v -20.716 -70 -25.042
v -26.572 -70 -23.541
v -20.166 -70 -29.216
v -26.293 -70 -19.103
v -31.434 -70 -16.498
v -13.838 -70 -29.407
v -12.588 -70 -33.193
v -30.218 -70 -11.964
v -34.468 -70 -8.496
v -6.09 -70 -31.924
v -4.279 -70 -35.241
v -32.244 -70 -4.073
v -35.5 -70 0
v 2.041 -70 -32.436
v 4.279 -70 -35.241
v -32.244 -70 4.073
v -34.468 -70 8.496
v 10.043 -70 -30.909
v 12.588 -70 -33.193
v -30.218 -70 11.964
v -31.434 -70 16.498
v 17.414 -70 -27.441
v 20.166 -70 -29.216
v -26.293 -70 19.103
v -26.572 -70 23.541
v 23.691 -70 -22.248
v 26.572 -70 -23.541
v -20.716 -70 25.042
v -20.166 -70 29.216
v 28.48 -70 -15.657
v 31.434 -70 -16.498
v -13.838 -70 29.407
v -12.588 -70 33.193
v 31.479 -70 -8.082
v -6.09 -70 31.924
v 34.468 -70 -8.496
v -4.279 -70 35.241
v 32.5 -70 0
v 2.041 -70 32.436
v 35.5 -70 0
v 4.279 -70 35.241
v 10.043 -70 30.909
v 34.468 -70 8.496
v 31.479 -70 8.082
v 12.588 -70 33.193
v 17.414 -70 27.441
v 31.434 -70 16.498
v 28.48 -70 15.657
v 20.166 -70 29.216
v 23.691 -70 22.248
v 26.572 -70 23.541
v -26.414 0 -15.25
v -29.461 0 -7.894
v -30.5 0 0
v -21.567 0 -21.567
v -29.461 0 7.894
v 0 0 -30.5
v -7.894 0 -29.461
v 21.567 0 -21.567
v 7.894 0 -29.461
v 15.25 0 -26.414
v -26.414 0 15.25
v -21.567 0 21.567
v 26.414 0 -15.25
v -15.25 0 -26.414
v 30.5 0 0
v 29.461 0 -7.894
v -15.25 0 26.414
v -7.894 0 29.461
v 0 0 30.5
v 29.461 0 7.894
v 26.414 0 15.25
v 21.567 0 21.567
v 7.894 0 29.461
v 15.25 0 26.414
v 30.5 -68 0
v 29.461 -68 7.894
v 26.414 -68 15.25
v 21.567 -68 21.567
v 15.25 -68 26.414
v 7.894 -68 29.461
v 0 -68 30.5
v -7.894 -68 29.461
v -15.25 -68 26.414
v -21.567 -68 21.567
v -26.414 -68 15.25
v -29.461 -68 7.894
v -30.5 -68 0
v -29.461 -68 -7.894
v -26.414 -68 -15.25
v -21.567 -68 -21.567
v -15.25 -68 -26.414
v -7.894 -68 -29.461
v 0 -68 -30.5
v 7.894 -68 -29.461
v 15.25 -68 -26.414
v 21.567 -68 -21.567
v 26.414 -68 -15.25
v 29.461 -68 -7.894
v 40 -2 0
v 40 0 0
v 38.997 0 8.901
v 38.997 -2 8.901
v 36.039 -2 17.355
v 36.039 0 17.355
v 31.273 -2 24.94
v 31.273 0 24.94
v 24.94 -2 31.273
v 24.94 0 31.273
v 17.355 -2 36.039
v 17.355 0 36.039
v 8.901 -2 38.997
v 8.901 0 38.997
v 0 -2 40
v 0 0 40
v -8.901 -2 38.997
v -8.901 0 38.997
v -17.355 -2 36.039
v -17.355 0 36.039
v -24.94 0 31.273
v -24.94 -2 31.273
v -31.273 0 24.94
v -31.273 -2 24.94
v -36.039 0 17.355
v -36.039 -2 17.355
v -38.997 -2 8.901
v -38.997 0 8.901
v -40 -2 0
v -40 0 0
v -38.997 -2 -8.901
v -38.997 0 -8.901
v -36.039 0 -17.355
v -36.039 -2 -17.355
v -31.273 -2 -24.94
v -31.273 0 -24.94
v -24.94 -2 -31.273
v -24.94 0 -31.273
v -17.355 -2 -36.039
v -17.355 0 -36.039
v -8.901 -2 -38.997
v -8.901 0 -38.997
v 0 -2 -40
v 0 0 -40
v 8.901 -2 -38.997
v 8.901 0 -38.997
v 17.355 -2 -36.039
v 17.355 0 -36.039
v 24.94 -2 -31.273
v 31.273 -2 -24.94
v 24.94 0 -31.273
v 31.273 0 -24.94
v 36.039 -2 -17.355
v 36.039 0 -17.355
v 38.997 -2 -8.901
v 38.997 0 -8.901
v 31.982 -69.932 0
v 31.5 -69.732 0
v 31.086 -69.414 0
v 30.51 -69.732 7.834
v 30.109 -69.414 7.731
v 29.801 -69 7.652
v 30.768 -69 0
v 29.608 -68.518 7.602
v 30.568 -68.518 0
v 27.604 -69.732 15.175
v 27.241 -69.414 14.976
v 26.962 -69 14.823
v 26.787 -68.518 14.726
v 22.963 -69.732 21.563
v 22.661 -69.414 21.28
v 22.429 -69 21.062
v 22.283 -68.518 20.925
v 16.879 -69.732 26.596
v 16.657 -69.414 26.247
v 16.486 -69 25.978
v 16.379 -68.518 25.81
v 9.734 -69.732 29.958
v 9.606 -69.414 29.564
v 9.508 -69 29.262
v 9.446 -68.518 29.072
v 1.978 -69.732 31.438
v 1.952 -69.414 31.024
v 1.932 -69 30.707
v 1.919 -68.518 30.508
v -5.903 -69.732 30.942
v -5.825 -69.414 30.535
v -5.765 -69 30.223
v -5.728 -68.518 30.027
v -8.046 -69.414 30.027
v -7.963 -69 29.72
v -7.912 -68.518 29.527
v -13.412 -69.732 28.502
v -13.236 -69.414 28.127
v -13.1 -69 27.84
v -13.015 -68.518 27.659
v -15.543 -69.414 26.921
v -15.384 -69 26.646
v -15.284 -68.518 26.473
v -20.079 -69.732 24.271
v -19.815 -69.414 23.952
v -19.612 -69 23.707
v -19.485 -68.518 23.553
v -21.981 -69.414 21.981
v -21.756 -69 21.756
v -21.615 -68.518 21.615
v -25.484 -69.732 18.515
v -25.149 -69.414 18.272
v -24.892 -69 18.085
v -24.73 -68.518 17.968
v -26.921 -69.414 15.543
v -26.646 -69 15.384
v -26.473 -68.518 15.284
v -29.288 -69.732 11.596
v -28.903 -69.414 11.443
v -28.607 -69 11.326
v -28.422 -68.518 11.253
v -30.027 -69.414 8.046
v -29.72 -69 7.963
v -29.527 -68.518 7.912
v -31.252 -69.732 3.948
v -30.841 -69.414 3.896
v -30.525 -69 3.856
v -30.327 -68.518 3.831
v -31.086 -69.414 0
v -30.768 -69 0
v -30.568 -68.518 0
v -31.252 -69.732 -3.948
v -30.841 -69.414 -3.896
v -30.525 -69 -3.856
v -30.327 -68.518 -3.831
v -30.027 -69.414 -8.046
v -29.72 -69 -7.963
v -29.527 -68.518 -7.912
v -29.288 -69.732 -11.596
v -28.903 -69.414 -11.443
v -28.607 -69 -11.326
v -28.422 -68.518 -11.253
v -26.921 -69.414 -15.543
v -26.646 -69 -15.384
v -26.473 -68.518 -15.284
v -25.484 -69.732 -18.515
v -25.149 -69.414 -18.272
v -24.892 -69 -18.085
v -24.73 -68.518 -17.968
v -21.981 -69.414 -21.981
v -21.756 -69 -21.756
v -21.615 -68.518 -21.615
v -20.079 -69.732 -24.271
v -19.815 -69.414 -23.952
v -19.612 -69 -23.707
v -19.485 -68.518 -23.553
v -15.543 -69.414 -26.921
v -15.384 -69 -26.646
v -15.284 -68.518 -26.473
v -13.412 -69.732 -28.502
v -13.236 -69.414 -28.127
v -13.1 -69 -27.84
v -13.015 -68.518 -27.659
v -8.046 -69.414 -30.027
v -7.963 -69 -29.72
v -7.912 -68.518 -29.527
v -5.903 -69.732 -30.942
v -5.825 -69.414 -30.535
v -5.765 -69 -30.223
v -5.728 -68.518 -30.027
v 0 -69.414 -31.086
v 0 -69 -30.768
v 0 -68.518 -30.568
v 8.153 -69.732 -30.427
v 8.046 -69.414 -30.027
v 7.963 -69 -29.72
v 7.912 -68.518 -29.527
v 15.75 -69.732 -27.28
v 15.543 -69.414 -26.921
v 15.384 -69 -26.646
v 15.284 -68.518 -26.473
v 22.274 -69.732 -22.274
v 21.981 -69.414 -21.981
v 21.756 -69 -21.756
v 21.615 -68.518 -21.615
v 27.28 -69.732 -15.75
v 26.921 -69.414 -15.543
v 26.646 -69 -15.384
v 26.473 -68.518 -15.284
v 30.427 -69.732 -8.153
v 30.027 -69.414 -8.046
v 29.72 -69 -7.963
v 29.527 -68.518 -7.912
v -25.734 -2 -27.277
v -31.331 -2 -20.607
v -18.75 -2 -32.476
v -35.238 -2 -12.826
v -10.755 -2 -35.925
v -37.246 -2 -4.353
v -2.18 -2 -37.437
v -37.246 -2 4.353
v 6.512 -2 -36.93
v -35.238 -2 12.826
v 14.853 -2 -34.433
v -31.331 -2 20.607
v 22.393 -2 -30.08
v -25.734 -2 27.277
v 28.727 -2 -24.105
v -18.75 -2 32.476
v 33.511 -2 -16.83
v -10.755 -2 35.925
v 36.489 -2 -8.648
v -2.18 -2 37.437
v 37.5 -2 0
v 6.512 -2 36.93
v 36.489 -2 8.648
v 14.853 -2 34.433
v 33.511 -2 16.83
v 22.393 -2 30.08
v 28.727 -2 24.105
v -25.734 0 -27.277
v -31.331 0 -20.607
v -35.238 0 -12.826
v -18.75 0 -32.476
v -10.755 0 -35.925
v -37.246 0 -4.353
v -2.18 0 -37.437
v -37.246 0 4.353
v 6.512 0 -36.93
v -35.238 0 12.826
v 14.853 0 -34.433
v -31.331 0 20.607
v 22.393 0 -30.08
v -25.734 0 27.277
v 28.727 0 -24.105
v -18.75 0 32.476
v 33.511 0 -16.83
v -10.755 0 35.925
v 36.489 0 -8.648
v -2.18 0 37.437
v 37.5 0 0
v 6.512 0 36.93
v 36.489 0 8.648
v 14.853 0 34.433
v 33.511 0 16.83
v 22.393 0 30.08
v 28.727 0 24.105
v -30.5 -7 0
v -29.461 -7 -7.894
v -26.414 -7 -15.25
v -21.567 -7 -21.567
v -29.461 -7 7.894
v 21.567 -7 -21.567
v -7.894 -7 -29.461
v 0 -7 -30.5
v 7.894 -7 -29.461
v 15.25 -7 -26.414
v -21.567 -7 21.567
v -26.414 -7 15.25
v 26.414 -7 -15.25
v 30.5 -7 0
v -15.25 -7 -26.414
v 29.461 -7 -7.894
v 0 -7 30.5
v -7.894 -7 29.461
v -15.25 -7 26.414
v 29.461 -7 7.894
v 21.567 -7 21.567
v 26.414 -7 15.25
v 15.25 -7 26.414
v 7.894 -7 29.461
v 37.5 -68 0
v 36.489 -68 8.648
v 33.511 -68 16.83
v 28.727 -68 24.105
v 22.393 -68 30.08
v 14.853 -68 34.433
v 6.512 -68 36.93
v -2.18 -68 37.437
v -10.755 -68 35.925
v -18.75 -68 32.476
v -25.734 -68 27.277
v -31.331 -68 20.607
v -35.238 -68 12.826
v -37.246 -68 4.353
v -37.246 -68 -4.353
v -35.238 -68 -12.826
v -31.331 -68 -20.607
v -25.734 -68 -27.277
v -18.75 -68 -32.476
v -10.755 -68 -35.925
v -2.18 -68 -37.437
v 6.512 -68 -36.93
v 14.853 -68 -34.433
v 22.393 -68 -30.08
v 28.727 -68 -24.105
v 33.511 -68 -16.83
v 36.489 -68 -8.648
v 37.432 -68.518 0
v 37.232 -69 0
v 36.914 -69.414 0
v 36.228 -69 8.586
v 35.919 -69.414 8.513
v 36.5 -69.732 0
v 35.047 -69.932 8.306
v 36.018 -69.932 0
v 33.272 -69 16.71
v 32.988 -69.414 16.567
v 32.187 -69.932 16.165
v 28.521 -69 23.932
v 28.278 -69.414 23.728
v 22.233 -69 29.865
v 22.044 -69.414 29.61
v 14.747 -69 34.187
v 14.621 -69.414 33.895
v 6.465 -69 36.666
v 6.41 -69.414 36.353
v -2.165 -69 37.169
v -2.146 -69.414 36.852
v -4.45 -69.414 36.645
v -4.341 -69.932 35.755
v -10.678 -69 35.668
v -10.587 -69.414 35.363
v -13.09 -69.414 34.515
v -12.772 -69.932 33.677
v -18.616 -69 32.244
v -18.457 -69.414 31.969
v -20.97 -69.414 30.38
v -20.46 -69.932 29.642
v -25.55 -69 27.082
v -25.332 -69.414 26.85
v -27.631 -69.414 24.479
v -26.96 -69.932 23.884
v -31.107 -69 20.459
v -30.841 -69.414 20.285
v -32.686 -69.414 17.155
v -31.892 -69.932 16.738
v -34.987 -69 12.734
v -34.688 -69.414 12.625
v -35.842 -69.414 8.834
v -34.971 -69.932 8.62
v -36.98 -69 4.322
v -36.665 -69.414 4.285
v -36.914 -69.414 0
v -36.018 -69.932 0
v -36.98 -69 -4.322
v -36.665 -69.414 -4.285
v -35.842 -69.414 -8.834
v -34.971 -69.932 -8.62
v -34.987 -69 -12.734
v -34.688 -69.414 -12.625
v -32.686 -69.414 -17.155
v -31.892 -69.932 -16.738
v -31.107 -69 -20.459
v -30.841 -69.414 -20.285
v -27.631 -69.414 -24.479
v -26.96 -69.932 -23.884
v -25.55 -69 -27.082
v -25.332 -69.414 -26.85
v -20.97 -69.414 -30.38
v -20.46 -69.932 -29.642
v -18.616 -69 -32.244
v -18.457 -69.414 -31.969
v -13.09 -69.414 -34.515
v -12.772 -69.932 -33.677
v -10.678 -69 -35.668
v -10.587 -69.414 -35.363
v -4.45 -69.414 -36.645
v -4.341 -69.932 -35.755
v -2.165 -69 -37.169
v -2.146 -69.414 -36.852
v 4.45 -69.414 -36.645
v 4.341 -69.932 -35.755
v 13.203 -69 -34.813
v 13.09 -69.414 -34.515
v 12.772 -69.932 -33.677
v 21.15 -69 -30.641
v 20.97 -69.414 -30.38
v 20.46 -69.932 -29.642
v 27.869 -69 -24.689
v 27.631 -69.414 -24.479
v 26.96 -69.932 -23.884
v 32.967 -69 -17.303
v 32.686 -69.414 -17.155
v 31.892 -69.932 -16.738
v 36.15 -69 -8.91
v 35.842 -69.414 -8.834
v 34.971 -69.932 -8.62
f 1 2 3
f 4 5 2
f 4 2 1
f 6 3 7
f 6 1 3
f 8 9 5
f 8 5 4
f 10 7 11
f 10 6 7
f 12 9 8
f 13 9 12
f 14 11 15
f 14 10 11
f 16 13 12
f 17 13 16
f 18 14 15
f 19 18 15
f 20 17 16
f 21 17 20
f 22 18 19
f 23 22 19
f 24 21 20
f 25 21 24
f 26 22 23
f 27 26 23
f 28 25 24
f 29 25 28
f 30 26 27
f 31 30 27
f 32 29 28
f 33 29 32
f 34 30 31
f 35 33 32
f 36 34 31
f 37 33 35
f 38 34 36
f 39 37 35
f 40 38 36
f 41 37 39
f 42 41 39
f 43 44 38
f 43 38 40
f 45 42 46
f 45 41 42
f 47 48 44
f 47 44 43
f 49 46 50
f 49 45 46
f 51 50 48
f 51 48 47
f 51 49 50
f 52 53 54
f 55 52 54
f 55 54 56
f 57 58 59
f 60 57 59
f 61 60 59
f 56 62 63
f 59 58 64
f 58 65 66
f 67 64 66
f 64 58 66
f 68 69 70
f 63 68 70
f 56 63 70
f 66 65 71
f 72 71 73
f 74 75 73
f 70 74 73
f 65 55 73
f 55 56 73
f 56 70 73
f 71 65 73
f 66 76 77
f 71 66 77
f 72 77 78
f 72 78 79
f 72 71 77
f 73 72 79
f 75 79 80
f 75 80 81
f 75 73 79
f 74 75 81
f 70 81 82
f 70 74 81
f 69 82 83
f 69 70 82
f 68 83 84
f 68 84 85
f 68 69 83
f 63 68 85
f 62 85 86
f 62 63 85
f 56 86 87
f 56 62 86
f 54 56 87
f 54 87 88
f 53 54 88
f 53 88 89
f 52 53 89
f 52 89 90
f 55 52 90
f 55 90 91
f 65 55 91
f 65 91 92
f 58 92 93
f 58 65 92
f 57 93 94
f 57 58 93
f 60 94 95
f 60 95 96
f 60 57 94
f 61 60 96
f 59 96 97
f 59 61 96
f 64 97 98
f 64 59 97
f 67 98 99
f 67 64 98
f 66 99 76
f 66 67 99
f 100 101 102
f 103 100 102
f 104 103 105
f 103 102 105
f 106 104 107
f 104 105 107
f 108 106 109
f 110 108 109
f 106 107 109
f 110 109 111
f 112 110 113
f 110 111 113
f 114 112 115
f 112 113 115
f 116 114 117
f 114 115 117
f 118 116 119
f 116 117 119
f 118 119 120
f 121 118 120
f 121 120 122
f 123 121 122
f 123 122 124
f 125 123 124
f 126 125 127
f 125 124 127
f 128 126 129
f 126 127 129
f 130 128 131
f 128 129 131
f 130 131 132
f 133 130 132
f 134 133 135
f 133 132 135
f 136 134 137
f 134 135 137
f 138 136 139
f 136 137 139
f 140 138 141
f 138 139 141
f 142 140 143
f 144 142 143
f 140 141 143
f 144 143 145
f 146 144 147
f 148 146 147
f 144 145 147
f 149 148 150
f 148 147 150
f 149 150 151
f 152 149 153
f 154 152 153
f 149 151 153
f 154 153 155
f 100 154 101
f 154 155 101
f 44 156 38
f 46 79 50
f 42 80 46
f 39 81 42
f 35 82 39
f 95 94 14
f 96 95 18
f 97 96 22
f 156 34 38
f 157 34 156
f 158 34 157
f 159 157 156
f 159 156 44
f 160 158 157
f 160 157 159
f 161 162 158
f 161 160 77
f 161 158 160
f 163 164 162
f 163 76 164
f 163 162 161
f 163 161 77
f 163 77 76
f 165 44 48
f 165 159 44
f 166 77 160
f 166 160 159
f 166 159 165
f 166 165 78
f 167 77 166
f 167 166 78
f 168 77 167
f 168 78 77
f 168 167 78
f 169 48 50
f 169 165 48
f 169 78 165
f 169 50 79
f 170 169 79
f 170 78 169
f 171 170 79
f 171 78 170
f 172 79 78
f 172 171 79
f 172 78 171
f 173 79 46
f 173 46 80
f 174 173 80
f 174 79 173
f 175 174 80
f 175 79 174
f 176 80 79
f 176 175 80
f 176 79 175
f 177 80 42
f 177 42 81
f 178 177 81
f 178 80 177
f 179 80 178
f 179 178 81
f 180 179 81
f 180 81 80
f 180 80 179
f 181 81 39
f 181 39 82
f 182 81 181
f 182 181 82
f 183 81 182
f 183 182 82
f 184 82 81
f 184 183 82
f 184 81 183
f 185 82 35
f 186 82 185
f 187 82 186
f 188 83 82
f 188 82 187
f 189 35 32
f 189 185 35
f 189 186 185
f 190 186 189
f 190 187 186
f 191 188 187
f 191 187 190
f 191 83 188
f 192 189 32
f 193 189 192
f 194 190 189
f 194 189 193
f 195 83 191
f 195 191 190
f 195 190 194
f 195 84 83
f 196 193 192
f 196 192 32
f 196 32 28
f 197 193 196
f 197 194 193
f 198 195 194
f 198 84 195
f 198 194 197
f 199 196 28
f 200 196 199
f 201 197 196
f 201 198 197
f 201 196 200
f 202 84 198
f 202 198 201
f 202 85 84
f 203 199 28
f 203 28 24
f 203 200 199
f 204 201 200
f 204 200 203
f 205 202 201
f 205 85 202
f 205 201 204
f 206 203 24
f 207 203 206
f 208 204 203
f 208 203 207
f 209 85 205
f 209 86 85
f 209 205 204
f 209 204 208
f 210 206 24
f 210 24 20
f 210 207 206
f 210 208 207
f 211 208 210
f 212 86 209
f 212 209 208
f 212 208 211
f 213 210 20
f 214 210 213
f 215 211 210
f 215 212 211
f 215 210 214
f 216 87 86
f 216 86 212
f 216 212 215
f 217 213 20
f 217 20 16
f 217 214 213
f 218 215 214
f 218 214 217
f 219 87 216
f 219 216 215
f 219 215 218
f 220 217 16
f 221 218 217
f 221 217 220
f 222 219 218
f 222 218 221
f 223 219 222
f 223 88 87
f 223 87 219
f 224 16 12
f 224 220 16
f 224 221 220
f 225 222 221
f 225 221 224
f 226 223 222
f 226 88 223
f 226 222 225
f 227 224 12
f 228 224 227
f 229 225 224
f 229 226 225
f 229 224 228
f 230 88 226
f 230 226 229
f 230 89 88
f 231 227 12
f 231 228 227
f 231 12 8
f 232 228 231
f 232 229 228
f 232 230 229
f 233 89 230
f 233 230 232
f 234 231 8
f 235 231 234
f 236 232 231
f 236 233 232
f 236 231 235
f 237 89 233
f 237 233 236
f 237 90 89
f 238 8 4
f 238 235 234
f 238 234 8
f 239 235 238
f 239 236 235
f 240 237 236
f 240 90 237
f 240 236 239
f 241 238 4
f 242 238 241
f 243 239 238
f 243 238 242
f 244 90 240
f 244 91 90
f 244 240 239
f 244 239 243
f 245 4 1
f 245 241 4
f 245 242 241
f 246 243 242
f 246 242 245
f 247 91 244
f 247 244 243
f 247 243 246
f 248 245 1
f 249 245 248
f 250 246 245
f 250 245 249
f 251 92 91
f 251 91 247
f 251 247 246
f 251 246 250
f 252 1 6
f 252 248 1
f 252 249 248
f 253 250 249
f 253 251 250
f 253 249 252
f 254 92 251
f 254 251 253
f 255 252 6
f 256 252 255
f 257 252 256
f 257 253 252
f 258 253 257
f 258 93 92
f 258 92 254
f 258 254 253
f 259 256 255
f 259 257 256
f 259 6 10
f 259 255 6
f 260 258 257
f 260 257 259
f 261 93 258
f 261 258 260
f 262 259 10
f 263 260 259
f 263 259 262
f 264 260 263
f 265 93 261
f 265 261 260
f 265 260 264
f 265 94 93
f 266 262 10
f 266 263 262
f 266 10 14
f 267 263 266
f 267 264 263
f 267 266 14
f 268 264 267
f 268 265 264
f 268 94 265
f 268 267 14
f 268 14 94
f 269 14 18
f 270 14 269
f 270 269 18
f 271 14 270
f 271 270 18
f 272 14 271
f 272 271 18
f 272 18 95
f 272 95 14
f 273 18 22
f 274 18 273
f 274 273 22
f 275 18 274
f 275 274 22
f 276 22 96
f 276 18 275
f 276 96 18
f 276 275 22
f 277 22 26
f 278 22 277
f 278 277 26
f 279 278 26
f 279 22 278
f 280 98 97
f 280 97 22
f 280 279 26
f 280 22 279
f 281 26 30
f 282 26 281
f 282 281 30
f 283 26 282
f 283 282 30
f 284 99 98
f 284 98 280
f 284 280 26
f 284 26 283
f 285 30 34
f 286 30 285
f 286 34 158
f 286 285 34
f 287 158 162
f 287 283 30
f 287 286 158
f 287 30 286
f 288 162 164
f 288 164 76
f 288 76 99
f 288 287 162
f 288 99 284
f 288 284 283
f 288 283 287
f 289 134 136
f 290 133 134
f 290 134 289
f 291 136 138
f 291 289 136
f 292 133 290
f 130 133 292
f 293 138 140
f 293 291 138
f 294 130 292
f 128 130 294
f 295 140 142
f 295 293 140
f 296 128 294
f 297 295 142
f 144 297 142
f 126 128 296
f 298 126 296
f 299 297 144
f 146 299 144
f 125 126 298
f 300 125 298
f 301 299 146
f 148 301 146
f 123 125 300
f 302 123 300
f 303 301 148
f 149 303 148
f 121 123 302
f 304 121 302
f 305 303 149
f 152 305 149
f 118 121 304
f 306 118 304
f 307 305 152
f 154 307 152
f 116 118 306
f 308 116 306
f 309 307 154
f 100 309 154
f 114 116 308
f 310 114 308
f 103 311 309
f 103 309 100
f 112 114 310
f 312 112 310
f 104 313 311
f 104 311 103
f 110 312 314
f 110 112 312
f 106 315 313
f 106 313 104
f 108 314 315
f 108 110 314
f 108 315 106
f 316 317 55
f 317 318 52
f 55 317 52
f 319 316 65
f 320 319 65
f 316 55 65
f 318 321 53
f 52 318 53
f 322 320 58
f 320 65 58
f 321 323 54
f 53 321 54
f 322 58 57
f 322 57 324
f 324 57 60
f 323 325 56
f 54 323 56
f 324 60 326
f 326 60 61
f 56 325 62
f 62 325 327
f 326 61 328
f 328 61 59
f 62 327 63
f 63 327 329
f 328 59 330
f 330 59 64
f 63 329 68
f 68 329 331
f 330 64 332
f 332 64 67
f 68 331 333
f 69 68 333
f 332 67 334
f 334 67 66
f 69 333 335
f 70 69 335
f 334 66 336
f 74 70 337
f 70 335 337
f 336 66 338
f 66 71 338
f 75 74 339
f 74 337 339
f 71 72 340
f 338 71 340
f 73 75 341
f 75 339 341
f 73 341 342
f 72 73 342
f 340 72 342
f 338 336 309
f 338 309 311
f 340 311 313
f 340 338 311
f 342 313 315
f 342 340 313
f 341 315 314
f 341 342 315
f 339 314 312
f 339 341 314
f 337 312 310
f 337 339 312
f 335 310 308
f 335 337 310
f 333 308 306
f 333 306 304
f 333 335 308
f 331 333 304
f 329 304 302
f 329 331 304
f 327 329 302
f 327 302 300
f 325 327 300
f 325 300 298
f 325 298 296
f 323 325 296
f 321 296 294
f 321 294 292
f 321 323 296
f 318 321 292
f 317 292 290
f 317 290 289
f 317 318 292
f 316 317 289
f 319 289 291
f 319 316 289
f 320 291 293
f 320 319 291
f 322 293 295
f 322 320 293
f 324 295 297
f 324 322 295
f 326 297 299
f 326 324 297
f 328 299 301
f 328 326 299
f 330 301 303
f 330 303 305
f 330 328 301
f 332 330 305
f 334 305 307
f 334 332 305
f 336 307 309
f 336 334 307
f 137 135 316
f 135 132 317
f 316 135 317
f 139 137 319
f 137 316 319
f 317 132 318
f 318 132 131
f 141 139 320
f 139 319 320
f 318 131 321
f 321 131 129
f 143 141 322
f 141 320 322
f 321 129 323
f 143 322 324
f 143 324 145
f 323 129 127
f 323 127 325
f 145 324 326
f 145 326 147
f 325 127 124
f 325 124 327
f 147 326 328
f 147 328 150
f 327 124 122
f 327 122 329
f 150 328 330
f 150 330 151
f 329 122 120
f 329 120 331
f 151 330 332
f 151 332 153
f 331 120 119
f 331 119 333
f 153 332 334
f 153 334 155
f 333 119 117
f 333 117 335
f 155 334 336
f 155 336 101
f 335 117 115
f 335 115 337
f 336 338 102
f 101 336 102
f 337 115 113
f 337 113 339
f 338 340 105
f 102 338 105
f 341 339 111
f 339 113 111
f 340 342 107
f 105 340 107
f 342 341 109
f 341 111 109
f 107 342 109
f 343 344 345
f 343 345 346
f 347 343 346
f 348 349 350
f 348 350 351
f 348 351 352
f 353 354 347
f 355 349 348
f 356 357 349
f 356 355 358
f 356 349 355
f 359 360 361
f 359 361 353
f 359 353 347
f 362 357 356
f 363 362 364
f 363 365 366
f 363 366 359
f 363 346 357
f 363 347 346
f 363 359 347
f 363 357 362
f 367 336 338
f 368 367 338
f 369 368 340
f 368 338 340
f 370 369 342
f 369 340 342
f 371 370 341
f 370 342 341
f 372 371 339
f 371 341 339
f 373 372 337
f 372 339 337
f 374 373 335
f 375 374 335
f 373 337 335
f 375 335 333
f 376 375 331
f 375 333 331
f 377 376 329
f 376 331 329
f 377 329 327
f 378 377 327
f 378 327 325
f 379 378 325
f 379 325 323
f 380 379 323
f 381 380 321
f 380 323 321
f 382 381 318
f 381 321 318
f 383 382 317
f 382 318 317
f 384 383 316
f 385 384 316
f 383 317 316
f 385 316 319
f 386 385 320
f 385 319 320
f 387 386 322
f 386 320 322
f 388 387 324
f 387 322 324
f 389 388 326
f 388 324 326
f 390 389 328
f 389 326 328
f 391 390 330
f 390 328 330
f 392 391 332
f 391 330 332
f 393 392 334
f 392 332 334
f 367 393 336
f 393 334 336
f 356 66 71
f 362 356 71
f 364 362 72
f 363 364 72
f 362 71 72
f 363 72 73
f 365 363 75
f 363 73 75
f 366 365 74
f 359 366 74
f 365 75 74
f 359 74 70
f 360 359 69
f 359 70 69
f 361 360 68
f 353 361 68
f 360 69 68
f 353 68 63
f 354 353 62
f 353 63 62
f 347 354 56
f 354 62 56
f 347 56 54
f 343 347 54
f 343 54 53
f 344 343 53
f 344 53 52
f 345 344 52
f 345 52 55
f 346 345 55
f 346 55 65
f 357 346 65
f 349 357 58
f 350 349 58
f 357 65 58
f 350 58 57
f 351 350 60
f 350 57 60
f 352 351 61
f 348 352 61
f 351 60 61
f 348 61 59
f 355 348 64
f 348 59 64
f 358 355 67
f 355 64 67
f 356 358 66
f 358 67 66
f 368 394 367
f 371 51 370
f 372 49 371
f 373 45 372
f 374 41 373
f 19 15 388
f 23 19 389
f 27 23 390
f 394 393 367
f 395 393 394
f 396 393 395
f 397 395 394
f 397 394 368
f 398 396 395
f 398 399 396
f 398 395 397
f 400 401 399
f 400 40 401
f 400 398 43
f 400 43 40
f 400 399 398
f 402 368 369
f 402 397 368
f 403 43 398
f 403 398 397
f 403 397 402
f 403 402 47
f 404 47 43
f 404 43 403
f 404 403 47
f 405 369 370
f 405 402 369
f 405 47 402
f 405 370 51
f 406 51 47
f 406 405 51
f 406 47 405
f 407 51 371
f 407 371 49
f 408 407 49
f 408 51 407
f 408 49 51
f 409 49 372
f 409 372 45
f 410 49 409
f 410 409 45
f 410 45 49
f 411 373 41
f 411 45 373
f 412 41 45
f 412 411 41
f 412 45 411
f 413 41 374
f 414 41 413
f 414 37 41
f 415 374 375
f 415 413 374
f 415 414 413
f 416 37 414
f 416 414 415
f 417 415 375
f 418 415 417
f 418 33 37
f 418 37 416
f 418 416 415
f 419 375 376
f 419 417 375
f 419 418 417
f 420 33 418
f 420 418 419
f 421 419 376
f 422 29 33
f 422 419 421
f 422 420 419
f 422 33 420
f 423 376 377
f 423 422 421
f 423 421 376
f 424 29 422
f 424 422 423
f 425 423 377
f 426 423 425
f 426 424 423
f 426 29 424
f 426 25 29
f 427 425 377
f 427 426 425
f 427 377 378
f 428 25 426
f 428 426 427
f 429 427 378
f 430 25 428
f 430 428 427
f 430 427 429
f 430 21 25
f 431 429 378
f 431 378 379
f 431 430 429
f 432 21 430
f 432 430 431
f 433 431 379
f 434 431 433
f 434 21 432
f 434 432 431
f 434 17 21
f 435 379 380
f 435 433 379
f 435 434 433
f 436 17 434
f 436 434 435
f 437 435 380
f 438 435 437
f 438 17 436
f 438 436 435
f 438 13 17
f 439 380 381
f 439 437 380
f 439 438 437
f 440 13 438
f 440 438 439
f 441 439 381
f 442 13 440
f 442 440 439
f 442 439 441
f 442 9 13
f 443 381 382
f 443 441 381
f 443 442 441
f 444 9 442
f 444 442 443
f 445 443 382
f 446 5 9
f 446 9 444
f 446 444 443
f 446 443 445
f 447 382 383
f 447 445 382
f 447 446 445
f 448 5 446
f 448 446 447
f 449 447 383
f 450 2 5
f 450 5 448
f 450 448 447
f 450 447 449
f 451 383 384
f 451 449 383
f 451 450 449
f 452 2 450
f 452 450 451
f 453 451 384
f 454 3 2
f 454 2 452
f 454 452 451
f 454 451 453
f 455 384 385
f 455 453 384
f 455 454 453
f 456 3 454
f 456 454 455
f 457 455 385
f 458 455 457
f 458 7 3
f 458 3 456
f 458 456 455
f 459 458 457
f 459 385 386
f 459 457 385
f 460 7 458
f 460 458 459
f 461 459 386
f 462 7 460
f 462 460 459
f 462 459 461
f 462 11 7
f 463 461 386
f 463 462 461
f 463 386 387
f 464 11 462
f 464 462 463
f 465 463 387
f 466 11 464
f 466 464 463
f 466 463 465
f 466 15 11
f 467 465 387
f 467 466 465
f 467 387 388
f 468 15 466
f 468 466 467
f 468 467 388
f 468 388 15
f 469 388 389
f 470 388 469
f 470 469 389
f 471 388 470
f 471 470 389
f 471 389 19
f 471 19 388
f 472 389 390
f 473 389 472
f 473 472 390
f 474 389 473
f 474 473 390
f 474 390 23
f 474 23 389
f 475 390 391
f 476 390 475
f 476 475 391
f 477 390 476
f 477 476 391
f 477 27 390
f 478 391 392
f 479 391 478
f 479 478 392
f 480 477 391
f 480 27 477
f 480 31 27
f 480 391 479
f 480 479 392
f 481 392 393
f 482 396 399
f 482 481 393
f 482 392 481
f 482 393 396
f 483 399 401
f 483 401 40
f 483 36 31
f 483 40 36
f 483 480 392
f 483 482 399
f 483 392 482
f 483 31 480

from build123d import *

# Parameters (mm, degrees)
F0_R     = 40
F0_R_2   = 37.5
F1_DEPTH = 2
F0_R_3   = 30.5
F2_DEPTH = 7
F3_DEPTH = 70
F4_R     = 2
F5_R     = 2


with BuildPart() as f1:
    # F0 (on Front) → F1 (new body)
    with BuildSketch(Plane.XZ):
        Circle(F0_R)
        Circle(F0_R_2, mode=Mode.SUBTRACT)
    extrude(amount=F1_DEPTH)


with BuildPart() as f2:
    # F0 (on Front) → F2 (new body)
    with BuildSketch(Plane.XZ):
        Circle(F0_R_3)
    extrude(amount=F2_DEPTH)


with BuildPart() as f3:
    # F0 (on Front) → F3 (new body)
    with BuildSketch(Plane.XZ):
        Circle(F0_R_2)
        Circle(F0_R_3, mode=Mode.SUBTRACT)
    extrude(amount=F3_DEPTH)

    # F4
    f4_edges = [f3.edges().sort_by_distance(p)[0] for p in [
        (-37.5, -70, 0),
    ]]
    fillet(f4_edges, radius=F4_R)

    # F5
    f5_edges = [f3.edges().sort_by_distance(p)[0] for p in [
        (-30.5, -70, 0),
    ]]
    fillet(f5_edges, radius=F5_R)


solid = Compound([f1.part, f2.part, f3.part])
